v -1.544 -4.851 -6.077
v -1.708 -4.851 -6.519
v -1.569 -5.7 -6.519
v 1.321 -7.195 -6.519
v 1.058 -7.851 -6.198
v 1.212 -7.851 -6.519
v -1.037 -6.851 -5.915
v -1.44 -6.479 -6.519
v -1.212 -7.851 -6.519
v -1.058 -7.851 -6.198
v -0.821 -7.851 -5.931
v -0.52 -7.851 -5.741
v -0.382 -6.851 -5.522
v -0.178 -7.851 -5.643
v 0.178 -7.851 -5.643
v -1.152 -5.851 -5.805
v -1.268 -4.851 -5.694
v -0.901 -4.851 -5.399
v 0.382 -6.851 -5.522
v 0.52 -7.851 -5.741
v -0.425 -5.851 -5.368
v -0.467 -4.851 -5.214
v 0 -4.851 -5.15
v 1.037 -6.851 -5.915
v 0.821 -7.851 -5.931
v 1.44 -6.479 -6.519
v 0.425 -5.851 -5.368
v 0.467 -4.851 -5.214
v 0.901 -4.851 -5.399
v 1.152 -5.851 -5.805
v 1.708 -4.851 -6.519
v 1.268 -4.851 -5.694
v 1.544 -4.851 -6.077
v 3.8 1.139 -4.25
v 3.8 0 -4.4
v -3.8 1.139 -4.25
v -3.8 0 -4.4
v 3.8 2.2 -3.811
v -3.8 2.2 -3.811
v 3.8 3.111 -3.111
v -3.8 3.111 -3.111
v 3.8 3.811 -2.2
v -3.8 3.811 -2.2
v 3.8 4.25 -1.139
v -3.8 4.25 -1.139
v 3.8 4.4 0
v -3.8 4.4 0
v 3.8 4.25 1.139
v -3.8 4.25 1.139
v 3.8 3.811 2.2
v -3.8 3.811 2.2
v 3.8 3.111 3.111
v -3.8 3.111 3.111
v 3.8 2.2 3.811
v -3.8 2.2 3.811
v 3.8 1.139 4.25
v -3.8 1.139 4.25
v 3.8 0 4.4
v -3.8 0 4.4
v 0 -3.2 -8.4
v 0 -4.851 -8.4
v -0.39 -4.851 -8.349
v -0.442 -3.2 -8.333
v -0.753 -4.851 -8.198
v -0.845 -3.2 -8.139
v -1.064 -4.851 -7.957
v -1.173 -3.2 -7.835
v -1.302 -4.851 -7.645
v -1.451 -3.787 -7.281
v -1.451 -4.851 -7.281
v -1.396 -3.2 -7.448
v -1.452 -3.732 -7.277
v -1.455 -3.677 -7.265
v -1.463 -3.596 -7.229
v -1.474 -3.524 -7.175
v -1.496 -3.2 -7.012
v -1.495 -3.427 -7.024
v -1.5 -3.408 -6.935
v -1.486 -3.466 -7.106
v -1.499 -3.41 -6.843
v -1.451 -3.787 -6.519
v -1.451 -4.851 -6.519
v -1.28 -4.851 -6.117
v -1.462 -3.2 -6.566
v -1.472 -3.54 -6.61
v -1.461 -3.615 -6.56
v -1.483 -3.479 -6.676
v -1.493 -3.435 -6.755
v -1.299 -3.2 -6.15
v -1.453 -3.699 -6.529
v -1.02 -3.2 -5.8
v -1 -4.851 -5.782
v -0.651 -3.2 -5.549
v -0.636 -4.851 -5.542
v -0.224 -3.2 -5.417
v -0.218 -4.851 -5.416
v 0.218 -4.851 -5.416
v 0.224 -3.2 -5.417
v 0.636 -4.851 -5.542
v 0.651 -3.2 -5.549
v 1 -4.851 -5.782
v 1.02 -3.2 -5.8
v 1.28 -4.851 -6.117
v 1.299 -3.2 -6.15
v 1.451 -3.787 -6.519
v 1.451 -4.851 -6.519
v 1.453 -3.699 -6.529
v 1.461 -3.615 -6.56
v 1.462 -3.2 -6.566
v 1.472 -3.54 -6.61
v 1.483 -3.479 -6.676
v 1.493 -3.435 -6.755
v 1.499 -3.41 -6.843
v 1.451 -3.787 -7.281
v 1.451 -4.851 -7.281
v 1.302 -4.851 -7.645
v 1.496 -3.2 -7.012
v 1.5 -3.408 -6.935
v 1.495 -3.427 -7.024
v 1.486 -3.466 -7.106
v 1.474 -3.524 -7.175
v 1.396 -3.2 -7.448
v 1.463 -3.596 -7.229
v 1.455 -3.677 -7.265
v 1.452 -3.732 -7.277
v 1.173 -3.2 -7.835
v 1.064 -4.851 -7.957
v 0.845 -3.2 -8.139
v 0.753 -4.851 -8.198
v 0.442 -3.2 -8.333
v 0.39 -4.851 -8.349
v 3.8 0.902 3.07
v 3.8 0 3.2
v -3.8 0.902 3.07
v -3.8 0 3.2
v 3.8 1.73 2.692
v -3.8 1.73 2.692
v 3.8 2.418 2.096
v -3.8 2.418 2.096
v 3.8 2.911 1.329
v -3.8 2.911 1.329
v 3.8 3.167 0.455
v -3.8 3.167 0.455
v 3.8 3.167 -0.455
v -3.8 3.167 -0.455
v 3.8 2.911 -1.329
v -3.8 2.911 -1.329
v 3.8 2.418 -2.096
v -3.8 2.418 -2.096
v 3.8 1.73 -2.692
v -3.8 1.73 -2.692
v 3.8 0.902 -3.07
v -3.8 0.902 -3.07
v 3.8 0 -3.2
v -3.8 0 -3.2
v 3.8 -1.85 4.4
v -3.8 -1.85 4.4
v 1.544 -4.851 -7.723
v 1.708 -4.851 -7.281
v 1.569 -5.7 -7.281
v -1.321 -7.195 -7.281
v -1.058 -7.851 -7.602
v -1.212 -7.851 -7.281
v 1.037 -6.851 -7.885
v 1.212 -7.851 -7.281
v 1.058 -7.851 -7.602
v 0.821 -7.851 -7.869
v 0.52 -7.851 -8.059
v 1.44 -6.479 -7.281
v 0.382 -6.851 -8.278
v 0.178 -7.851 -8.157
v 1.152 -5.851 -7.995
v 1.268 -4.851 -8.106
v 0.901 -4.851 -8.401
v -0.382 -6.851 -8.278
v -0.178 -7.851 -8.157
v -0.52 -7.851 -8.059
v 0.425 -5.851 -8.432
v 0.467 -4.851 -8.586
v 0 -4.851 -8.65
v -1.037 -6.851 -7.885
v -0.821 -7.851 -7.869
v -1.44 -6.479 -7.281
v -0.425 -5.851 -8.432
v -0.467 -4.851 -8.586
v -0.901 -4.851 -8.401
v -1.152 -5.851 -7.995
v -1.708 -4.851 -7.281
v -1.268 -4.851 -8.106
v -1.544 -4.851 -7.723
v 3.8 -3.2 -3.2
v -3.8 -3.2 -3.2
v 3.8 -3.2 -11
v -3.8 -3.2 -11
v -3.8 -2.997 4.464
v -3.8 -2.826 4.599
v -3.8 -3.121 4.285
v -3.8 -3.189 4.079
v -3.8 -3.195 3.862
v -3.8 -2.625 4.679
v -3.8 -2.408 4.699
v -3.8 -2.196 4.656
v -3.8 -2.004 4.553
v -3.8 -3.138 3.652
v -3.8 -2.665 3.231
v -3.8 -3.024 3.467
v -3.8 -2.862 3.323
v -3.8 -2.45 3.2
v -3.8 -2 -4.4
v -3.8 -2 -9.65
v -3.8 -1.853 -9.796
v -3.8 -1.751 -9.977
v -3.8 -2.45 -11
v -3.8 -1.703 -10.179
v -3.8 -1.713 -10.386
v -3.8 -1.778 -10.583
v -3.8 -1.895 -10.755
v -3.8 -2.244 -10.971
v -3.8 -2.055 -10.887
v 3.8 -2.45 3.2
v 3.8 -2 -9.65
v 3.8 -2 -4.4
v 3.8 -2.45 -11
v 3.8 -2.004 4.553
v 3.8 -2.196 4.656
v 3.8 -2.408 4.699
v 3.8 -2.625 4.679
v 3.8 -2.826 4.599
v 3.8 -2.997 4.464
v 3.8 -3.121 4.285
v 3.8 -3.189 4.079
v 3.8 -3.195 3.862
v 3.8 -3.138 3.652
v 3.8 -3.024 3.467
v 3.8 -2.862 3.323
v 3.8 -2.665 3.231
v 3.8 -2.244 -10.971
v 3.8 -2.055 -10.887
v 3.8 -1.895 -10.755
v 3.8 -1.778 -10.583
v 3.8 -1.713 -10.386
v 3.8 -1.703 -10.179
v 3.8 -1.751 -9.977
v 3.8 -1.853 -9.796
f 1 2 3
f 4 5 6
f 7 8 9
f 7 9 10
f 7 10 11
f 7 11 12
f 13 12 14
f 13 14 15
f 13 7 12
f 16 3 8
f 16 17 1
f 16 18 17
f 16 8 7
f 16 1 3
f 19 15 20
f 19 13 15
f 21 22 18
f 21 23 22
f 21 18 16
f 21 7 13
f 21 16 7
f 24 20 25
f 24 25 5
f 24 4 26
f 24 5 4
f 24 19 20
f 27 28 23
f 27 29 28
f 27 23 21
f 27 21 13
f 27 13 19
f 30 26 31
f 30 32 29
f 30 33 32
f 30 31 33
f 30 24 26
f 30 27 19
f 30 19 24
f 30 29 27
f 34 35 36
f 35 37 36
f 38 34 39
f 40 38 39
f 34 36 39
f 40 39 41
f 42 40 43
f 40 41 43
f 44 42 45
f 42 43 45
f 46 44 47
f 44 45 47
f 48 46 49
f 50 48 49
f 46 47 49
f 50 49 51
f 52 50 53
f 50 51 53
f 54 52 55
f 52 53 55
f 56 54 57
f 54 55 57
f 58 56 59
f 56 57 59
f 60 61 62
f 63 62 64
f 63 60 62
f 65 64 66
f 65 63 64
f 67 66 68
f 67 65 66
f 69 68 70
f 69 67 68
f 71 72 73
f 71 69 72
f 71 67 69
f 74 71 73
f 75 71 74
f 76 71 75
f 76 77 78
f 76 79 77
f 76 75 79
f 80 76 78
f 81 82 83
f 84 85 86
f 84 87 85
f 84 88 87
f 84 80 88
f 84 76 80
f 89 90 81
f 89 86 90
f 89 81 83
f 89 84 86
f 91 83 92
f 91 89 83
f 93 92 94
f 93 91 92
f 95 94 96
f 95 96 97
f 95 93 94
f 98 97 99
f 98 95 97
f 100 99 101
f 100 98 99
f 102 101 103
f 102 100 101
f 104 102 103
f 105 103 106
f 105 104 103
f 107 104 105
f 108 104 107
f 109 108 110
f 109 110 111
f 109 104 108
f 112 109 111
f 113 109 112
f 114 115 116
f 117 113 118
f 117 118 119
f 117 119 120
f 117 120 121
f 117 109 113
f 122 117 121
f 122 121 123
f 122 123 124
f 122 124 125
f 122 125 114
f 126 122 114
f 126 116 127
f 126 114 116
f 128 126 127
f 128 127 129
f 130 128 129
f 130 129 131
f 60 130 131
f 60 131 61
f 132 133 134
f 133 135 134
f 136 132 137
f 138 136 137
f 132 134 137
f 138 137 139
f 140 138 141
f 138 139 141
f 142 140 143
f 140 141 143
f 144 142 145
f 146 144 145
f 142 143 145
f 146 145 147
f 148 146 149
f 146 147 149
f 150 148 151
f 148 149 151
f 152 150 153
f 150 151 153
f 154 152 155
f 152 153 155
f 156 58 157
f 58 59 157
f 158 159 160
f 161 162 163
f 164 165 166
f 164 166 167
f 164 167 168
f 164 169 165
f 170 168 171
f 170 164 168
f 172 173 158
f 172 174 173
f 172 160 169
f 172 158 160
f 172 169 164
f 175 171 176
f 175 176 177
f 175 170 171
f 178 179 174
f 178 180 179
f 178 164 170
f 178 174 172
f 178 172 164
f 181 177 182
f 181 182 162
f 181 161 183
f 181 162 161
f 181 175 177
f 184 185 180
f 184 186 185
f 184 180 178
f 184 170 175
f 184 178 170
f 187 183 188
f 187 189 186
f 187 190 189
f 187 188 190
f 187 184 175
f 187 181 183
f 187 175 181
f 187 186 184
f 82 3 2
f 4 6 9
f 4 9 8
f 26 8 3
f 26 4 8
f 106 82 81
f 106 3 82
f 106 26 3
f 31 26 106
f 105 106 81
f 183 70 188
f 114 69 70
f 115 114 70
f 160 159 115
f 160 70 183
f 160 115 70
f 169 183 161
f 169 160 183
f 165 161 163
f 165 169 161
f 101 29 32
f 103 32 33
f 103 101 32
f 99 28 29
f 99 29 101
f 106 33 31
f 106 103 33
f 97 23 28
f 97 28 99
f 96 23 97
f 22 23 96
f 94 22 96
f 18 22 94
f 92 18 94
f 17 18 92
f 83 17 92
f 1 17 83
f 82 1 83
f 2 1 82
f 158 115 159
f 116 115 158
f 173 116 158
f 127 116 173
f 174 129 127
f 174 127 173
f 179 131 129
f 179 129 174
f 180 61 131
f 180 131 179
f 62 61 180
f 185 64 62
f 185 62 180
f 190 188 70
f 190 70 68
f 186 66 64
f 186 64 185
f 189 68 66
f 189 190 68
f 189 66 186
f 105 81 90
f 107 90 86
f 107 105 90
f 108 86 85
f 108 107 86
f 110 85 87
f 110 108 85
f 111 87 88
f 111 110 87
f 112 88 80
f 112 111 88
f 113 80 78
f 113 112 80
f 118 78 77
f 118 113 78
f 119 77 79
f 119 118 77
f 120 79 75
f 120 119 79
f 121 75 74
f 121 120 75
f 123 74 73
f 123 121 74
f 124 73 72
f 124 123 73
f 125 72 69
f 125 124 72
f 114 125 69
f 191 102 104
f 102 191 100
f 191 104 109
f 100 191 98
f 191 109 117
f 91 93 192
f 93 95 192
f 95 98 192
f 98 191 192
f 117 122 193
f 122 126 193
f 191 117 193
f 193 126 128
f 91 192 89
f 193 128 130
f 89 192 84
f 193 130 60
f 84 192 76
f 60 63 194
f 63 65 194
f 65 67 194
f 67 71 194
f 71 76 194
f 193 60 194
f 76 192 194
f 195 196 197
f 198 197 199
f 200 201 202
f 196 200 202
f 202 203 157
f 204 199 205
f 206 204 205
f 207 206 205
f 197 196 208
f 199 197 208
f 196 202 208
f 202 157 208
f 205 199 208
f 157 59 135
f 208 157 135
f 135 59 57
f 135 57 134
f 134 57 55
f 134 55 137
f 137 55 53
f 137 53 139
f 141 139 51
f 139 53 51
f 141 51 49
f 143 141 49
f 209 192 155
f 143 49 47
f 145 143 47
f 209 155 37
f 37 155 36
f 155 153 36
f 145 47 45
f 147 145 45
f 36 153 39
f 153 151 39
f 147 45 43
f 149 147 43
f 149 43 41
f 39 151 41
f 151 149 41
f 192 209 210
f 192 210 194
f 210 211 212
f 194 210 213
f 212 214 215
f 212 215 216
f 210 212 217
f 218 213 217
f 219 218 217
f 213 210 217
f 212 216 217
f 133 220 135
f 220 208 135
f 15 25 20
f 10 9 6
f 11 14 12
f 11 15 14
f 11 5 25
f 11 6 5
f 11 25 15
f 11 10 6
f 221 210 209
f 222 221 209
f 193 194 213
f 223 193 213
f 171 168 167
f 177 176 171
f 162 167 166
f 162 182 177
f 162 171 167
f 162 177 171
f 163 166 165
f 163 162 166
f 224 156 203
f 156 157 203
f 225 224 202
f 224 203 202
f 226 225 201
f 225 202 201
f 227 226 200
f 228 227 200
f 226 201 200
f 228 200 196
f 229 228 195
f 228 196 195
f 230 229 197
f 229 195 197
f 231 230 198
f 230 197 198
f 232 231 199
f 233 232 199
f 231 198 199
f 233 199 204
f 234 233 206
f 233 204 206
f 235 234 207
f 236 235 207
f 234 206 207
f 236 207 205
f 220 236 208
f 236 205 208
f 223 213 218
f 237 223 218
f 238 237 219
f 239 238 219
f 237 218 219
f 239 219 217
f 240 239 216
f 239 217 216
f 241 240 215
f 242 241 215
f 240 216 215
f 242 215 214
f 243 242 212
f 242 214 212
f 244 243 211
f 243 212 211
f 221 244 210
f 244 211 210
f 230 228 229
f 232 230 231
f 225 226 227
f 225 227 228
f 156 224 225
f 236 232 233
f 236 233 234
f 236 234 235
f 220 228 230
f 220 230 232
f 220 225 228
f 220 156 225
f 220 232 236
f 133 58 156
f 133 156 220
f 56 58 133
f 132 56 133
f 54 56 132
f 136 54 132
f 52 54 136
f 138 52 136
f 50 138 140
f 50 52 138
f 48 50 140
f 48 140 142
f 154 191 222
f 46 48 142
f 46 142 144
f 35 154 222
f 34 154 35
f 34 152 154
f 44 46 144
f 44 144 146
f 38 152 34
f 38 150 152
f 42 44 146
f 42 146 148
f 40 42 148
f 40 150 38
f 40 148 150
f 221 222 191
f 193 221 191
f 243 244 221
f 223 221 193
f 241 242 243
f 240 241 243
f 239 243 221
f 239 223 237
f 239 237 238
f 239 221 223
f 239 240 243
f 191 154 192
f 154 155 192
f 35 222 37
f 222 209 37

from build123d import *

# Parameters (mm, degrees)
BASE_EXTRUDE_DEPTH      = 3.8
CUT_EXTRUDE1_DEPTH      = 15.038454366
CUT_EXTRUDE1_DEPTH_BACK = 15.038454366


with BuildPart() as part:
    # Sketch1 → Base-Extrude (new, symmetric)
    with BuildSketch(Plane.ZY):
        with BuildLine():
            Line((-9.65, -2), (-4.4, -2))
            Line((-4.4, -2), (-4.4, 0))
            ThreePointArc((-4.4, 0), (0, 4.4), (4.4, 0))
            Line((4.4, 0), (4.4, -1.85))
            ThreePointArc((4.4, -1.85), (4.285410197, -3.120820393), (3.2, -2.45))
            Line((3.2, -2.45), (3.2, 0))
            ThreePointArc((3.2, 0), (0, 3.2), (-3.2, 0))
            Line((-3.2, 0), (-3.2, -3.2))
            Line((-3.2, -3.2), (-11, -3.2))
            Line((-11, -3.2), (-11, -2.45))
            ThreePointArc((-11, -2.45), (-10.487170825, -1.738487526), (-9.65, -2))
        make_face()
    extrude(amount=BASE_EXTRUDE_DEPTH, both=True)

    # Sketch4 → Boss-Revolve1 (revolve)
    with BuildSketch(Plane.ZY, mode=Mode.PRIVATE) as boss_revolve1_sk:
        Polygon((-6.9, -3.2), (-6.9, -7.851), (-5.63, -7.851), (-5.15, -4.851), (-5.4, -4.851), (-5.4, -3.2), align=None)
    revolve(boss_revolve1_sk.sketch.rotate(Axis((0, -3.2, -6.9), (0, 1, 0)), 180), axis=Axis((0, -3.2, -6.9), (0, 1, 0)))

    # Sketch5 → Cut-Extrude1 (cut, two sides: drawn at the far end of the back side and taken through both)
    with BuildSketch(Plane.ZY.offset(-CUT_EXTRUDE1_DEPTH_BACK)):
        with BuildLine():
            Line((-7.281, -7.851), (-6.519, -7.851))
            Line((-6.519, -7.851), (-6.519, -3.787))
            ThreePointArc((-6.519, -3.787), (-6.9, -3.406), (-7.281, -3.787))
            Line((-7.281, -3.787), (-7.281, -7.851))
        make_face()
    extrude(amount=CUT_EXTRUDE1_DEPTH + CUT_EXTRUDE1_DEPTH_BACK, mode=Mode.SUBTRACT)


solid = part.part
